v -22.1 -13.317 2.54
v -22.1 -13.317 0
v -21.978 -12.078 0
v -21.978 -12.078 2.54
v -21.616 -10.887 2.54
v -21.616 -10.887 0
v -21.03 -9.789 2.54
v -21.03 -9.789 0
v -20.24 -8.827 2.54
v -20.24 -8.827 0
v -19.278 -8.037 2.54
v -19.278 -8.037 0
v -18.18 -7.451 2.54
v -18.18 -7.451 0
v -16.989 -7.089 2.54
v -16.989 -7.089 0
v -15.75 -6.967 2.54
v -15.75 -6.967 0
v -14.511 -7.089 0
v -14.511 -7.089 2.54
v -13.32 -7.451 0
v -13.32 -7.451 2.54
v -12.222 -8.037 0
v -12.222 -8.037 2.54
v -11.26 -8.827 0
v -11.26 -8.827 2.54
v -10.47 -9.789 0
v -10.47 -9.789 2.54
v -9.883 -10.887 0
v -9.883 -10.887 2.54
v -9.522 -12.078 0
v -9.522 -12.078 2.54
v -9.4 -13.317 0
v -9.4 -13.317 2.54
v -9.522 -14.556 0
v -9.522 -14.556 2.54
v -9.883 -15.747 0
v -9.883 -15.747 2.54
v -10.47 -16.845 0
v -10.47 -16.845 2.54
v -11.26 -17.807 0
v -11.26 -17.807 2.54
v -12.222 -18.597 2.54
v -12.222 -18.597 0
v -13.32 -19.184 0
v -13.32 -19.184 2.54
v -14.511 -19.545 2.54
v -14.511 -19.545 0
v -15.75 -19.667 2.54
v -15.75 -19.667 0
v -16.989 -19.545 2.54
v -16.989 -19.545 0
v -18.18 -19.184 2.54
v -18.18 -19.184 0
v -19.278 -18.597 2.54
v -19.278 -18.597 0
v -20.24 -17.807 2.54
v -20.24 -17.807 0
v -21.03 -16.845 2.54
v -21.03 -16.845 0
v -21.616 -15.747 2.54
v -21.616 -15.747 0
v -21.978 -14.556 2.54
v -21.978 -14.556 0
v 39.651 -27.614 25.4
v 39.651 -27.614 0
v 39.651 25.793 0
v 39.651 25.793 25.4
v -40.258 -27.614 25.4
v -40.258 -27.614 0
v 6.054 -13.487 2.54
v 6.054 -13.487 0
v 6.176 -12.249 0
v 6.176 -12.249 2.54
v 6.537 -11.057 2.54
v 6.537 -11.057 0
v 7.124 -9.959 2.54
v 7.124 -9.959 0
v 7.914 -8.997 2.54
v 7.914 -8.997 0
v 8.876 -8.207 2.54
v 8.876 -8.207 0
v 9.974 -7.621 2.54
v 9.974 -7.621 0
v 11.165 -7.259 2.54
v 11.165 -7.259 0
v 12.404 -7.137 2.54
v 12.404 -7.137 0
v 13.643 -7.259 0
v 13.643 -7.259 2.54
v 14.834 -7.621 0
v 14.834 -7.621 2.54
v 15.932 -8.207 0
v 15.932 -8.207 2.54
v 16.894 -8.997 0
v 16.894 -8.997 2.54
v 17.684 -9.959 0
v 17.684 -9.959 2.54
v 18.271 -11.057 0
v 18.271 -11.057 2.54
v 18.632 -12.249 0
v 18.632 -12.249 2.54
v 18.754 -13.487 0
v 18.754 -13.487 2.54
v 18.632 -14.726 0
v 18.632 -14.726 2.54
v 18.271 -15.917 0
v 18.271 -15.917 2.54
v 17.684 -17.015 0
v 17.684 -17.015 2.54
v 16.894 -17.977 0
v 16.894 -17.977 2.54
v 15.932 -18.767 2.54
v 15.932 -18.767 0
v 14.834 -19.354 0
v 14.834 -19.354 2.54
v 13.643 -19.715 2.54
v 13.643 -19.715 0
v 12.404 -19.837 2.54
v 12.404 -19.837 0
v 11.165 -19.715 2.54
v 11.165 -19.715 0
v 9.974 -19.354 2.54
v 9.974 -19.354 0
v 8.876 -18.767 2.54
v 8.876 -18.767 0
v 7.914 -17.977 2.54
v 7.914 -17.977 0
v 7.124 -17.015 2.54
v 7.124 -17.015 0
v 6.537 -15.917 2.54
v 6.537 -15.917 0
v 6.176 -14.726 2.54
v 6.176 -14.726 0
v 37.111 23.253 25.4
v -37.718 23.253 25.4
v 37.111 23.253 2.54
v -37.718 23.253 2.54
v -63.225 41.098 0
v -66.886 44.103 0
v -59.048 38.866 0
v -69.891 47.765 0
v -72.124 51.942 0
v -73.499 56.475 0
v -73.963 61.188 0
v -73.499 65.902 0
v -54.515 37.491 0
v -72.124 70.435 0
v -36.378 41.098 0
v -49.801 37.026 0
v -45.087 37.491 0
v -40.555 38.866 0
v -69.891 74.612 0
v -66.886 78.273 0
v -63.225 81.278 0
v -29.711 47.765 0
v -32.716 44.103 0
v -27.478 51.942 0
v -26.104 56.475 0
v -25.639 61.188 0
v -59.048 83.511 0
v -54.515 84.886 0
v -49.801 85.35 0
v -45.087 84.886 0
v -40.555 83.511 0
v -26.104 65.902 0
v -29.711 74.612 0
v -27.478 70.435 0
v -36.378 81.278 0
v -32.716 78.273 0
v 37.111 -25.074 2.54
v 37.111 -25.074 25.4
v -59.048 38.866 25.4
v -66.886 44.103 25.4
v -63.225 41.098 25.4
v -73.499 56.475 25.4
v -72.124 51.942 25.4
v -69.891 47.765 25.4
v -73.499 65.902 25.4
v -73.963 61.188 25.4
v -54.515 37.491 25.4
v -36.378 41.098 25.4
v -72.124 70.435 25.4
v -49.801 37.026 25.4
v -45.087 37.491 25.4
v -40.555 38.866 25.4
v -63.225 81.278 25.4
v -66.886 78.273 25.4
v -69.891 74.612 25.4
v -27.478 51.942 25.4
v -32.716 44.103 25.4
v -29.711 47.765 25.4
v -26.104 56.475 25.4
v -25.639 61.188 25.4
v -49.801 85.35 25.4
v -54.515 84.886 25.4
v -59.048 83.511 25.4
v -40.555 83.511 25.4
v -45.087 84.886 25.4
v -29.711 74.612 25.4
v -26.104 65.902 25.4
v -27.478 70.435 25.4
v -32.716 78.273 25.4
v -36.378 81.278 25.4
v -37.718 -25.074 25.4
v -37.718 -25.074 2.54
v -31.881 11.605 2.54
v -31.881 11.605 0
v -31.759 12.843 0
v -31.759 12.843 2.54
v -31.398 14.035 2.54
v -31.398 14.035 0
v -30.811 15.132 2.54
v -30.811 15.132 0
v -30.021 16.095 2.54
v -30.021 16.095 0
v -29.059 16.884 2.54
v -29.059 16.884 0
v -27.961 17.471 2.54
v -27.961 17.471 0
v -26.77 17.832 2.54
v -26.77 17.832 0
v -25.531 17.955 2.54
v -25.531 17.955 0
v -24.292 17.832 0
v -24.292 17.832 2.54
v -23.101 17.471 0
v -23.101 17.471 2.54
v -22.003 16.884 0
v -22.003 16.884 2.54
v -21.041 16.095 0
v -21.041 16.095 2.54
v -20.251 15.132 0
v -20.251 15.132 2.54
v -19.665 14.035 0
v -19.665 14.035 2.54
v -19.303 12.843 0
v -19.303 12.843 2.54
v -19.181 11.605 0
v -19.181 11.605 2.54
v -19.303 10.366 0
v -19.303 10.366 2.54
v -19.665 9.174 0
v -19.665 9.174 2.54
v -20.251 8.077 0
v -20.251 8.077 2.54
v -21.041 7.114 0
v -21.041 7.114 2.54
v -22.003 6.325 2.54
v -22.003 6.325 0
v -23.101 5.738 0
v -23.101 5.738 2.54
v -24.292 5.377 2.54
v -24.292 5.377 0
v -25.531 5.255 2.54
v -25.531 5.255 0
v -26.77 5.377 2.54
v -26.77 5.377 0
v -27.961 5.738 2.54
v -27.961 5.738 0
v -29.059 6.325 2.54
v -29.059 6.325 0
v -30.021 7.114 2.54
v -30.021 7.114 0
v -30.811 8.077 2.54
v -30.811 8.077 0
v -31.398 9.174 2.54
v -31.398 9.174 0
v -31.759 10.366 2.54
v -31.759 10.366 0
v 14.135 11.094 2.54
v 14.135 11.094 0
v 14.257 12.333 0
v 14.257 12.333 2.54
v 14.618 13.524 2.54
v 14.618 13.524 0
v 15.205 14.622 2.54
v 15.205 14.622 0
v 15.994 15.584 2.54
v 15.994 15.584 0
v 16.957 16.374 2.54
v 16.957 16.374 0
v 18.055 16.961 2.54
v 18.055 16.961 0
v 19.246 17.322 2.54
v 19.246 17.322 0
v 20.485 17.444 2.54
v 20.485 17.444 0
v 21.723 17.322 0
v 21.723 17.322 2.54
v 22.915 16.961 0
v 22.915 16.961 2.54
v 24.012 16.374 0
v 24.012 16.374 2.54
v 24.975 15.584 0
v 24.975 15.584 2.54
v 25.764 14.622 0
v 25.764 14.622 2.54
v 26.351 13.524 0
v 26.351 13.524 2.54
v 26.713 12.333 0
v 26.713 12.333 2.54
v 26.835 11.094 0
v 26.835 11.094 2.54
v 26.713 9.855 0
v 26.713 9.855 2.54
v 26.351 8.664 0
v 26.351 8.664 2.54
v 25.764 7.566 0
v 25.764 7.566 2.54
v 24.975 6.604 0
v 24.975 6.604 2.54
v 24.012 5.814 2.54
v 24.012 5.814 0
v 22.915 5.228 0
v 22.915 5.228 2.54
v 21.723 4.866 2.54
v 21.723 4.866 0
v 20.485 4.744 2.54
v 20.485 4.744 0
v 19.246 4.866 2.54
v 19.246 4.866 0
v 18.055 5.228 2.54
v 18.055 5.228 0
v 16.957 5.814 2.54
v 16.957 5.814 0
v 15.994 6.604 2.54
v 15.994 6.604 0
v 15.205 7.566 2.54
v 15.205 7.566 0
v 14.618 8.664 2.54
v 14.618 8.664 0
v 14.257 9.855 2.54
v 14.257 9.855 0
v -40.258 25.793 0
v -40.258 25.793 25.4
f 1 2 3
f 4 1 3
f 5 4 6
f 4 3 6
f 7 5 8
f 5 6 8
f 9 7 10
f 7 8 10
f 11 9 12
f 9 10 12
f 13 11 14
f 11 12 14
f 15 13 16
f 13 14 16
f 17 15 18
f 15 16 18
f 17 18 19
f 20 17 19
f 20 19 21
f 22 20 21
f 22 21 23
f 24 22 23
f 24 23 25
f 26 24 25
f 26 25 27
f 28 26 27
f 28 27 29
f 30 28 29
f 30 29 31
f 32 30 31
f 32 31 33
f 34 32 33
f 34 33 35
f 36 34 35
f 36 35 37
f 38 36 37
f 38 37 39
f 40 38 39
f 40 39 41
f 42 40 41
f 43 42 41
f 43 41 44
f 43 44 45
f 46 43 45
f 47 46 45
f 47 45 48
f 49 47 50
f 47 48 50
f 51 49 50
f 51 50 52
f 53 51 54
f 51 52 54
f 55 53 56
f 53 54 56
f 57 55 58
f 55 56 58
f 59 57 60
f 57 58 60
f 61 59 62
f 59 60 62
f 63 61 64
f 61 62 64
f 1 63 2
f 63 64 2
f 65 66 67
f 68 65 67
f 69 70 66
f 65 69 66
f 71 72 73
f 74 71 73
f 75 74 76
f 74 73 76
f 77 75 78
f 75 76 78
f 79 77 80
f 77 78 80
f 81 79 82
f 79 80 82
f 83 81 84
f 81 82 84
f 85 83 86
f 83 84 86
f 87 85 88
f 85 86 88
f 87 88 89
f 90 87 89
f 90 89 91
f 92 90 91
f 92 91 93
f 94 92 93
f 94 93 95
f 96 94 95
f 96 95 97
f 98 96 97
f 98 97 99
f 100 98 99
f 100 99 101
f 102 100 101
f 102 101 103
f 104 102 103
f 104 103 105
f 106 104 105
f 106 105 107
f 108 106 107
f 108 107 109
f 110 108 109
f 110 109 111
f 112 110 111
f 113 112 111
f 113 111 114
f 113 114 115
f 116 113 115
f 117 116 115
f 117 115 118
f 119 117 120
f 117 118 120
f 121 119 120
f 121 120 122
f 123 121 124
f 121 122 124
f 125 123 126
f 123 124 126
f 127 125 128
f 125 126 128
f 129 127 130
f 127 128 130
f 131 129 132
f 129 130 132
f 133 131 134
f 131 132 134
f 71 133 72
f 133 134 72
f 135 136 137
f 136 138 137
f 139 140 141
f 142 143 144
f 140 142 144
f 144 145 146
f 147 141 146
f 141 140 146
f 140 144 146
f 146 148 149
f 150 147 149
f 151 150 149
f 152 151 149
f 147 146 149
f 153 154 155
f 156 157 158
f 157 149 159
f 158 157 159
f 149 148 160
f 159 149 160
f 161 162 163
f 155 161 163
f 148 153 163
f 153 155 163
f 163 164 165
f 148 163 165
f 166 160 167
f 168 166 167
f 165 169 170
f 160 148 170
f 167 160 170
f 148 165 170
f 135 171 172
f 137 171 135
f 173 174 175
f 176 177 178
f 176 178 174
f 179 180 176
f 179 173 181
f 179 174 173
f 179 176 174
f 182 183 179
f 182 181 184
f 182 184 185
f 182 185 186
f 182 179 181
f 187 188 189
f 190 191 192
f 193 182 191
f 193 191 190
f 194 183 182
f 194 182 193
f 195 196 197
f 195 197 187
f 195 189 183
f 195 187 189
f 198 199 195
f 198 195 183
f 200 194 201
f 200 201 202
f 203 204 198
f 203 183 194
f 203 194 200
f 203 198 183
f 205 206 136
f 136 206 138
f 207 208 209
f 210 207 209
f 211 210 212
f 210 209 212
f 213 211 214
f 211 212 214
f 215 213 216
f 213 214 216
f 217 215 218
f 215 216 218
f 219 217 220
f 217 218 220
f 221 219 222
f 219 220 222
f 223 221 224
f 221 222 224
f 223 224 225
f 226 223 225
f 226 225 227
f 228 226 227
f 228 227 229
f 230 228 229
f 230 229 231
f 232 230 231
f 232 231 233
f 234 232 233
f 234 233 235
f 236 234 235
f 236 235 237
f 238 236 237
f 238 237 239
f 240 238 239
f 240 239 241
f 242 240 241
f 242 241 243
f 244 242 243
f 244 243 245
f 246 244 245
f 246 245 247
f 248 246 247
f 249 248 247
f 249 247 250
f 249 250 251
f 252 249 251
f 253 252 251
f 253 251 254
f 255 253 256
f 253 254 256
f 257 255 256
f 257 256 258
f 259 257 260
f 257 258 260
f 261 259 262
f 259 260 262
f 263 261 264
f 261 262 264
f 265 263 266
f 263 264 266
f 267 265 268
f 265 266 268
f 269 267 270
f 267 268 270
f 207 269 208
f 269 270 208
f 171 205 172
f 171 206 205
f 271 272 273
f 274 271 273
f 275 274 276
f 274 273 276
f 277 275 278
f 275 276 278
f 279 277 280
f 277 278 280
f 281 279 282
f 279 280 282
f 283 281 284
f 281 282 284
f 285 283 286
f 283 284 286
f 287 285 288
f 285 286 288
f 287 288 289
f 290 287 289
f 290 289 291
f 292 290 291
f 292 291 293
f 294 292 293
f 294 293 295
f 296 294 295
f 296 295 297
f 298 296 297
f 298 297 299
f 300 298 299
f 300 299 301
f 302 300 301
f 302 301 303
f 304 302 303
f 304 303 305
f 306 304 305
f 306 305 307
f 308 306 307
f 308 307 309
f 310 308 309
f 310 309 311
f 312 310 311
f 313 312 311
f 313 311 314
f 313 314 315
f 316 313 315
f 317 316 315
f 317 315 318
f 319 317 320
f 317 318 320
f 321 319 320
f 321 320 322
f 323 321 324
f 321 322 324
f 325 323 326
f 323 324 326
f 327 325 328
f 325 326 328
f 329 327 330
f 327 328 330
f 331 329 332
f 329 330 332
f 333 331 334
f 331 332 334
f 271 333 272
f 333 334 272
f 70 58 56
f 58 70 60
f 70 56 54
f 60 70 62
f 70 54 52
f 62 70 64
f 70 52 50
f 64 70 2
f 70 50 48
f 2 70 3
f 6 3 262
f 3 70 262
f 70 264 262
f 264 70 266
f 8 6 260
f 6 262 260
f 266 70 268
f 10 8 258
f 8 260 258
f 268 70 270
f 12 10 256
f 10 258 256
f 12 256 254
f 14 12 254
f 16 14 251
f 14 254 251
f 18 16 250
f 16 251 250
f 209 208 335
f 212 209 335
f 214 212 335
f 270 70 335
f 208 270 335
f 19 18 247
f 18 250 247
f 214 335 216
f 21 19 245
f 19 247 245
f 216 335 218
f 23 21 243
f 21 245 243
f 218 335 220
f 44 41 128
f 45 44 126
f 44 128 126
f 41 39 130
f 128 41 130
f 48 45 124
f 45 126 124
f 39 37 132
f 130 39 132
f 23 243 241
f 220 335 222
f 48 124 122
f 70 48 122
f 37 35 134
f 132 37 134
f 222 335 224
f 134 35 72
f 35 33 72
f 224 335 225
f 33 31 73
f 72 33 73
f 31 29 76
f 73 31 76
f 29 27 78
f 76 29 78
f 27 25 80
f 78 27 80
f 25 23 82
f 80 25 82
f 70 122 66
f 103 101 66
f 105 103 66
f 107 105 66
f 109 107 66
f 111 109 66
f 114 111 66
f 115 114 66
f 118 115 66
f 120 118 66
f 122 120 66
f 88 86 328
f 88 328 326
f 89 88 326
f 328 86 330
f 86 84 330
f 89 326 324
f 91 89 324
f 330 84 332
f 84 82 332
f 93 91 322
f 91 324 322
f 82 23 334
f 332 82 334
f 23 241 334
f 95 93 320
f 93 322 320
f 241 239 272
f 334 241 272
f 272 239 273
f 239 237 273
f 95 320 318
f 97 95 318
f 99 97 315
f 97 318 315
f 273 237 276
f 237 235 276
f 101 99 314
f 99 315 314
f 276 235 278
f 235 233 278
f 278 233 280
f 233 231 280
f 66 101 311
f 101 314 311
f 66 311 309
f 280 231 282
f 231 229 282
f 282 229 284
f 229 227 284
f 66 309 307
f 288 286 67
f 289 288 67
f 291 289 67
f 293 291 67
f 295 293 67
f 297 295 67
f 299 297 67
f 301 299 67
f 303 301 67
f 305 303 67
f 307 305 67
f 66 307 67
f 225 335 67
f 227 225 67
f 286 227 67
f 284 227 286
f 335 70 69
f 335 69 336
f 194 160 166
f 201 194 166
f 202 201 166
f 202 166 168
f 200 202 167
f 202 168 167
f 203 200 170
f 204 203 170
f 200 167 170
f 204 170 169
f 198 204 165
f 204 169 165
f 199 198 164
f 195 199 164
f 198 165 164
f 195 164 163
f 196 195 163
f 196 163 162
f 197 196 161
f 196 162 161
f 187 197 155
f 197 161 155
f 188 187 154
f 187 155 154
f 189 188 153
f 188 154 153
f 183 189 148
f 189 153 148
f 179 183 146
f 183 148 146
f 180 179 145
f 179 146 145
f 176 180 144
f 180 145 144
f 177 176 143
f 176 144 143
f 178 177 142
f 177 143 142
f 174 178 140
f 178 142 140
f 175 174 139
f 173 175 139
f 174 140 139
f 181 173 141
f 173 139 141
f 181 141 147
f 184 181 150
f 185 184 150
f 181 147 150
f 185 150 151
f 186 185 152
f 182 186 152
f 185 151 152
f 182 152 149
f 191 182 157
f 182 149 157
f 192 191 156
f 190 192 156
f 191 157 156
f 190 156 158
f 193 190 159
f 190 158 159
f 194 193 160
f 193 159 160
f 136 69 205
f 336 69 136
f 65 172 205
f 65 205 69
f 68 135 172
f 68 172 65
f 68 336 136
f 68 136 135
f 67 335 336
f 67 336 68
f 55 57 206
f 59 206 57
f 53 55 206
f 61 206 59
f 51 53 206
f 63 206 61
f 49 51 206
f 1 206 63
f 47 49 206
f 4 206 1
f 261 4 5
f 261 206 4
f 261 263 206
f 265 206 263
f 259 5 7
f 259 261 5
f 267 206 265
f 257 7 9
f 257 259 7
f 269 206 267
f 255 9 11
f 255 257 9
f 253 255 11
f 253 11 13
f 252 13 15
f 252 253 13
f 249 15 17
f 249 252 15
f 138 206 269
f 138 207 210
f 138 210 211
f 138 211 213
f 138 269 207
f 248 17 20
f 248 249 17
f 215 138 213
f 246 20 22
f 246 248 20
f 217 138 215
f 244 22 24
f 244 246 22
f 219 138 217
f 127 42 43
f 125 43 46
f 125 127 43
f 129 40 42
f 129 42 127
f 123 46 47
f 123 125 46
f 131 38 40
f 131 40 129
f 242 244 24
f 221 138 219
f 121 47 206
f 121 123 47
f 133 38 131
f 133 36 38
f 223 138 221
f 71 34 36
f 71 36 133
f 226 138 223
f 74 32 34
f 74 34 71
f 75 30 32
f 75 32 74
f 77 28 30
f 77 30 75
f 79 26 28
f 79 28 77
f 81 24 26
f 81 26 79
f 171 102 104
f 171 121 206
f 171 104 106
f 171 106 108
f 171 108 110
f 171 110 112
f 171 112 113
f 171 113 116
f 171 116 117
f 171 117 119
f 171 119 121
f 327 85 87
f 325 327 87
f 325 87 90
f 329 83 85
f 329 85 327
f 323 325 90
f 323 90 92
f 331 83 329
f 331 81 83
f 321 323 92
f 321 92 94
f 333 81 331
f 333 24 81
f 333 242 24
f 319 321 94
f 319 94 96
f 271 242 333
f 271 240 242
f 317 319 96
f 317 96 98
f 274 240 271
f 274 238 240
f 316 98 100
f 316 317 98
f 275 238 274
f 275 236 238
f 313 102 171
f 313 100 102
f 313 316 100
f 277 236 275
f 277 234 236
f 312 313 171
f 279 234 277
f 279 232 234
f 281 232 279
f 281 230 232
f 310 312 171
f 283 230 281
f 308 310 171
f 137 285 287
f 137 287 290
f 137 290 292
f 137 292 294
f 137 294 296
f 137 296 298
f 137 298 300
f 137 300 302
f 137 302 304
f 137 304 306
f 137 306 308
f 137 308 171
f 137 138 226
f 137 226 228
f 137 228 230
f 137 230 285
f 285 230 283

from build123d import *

# Parameters (mm, degrees)
F0_W     = 79.908848
F0_H     = 53.407432
F1_DEPTH = 25.4
F2_T     = -2.54
F4_D     = 12.7
F5_R     = 24.161899
F6_DEPTH = 25.4


with BuildPart() as f1:
    # F0 (on Top) → F1 (new body)
    with BuildSketch(Plane.XY):
        with Locations((-0.303451, -0.910354)):
            Rectangle(F0_W, F0_H)
    extrude(amount=F1_DEPTH)

    # F2
    f2_openings = [f1.faces().sort_by_distance(p)[0] for p in [
        (-0.303451, -0.910354, 25.4),
    ]]
    offset(amount=F2_T, openings=f2_openings)

    # F4 (through all)
    with Locations(Plane.XY.offset(2.54)):
        with Locations((-25.531314, 11.604503), (20.484546, 11.09416), (12.404127, -13.487326), (-15.749754, -13.317212)):
            Hole(F4_D / 2)


with BuildPart() as f6:
    # F5 (on Top) → F6 (new body)
    with BuildSketch(Plane.XY):
        with Locations((-49.801171, 61.188258)):
            Circle(F5_R)
    extrude(amount=F6_DEPTH)


solid = Compound([f1.part, f6.part])
